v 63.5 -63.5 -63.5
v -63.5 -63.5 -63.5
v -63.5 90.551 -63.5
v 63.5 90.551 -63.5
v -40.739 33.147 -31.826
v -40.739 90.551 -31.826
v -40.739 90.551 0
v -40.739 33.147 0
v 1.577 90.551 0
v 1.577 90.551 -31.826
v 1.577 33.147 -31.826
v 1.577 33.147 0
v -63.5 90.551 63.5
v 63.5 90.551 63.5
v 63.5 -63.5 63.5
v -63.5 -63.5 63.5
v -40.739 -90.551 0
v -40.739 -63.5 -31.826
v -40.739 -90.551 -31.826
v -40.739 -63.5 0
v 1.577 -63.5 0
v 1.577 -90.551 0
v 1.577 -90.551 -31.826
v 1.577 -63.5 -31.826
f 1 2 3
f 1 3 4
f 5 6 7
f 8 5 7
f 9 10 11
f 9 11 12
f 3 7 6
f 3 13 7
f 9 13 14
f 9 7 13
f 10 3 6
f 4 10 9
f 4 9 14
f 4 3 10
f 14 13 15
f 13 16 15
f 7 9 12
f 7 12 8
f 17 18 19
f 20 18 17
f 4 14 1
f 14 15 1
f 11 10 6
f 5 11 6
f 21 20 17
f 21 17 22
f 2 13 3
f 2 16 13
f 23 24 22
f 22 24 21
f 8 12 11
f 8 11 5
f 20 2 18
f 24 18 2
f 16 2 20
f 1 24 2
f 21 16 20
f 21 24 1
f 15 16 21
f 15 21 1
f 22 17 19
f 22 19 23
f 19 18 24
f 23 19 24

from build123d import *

# Parameters (mm, degrees)
F0_W       = 127
F0_H       = 127
F1_DEPTH   = 63.5
F2_W       = 42.3164
F2_H       = 31.8262
F3_DEPTH   = 25.4
F1_FACE1_W = 127
F1_FACE1_H = 127
F4_DEPTH   = 27.051
F5_W       = 42.3164
F5_H       = 31.8262
F6_DEPTH   = 57.404


with BuildPart() as f1:
    # F0 (on Front) → F1 (new body, symmetric)
    with BuildSketch(Plane.XZ):
        Rectangle(F0_W, F0_H)
    extrude(amount=F1_DEPTH, both=True)

    # F2 (on face) → F3 (cut)
    with BuildSketch(Plane.XZ.offset(63.5)):
        with Locations((-19.5812878566, -15.9131)):
            Rectangle(F2_W, F2_H)
    extrude(amount=F3_DEPTH, mode=Mode.SUBTRACT)

    # F2 (on face) + F1_face1 (on face) → F4 (join, symmetric)
    with BuildSketch(Plane.XZ.offset(63.5)):
        with Locations((-19.5812878566, -15.9131)):
            Rectangle(F2_W, F2_H)
    with BuildSketch(Plane(origin=(0, 63.5, 0), x_dir=(1, 0, 0), z_dir=(0, 1, 0))):
        Rectangle(F1_FACE1_W, F1_FACE1_H)
    extrude(amount=F4_DEPTH, both=True, dir=(0, -1, 0))

    # F5 (on face) → F6 (cut, symmetric)
    with BuildSketch(Plane(origin=(0, 90.551, 0), x_dir=(-1, 0, 0), z_dir=(0, 1, 0))):
        with Locations((19.5812878566, -15.9131)):
            Rectangle(F5_W, F5_H)
    extrude(amount=F6_DEPTH, both=True, mode=Mode.SUBTRACT)


solid = f1.part
